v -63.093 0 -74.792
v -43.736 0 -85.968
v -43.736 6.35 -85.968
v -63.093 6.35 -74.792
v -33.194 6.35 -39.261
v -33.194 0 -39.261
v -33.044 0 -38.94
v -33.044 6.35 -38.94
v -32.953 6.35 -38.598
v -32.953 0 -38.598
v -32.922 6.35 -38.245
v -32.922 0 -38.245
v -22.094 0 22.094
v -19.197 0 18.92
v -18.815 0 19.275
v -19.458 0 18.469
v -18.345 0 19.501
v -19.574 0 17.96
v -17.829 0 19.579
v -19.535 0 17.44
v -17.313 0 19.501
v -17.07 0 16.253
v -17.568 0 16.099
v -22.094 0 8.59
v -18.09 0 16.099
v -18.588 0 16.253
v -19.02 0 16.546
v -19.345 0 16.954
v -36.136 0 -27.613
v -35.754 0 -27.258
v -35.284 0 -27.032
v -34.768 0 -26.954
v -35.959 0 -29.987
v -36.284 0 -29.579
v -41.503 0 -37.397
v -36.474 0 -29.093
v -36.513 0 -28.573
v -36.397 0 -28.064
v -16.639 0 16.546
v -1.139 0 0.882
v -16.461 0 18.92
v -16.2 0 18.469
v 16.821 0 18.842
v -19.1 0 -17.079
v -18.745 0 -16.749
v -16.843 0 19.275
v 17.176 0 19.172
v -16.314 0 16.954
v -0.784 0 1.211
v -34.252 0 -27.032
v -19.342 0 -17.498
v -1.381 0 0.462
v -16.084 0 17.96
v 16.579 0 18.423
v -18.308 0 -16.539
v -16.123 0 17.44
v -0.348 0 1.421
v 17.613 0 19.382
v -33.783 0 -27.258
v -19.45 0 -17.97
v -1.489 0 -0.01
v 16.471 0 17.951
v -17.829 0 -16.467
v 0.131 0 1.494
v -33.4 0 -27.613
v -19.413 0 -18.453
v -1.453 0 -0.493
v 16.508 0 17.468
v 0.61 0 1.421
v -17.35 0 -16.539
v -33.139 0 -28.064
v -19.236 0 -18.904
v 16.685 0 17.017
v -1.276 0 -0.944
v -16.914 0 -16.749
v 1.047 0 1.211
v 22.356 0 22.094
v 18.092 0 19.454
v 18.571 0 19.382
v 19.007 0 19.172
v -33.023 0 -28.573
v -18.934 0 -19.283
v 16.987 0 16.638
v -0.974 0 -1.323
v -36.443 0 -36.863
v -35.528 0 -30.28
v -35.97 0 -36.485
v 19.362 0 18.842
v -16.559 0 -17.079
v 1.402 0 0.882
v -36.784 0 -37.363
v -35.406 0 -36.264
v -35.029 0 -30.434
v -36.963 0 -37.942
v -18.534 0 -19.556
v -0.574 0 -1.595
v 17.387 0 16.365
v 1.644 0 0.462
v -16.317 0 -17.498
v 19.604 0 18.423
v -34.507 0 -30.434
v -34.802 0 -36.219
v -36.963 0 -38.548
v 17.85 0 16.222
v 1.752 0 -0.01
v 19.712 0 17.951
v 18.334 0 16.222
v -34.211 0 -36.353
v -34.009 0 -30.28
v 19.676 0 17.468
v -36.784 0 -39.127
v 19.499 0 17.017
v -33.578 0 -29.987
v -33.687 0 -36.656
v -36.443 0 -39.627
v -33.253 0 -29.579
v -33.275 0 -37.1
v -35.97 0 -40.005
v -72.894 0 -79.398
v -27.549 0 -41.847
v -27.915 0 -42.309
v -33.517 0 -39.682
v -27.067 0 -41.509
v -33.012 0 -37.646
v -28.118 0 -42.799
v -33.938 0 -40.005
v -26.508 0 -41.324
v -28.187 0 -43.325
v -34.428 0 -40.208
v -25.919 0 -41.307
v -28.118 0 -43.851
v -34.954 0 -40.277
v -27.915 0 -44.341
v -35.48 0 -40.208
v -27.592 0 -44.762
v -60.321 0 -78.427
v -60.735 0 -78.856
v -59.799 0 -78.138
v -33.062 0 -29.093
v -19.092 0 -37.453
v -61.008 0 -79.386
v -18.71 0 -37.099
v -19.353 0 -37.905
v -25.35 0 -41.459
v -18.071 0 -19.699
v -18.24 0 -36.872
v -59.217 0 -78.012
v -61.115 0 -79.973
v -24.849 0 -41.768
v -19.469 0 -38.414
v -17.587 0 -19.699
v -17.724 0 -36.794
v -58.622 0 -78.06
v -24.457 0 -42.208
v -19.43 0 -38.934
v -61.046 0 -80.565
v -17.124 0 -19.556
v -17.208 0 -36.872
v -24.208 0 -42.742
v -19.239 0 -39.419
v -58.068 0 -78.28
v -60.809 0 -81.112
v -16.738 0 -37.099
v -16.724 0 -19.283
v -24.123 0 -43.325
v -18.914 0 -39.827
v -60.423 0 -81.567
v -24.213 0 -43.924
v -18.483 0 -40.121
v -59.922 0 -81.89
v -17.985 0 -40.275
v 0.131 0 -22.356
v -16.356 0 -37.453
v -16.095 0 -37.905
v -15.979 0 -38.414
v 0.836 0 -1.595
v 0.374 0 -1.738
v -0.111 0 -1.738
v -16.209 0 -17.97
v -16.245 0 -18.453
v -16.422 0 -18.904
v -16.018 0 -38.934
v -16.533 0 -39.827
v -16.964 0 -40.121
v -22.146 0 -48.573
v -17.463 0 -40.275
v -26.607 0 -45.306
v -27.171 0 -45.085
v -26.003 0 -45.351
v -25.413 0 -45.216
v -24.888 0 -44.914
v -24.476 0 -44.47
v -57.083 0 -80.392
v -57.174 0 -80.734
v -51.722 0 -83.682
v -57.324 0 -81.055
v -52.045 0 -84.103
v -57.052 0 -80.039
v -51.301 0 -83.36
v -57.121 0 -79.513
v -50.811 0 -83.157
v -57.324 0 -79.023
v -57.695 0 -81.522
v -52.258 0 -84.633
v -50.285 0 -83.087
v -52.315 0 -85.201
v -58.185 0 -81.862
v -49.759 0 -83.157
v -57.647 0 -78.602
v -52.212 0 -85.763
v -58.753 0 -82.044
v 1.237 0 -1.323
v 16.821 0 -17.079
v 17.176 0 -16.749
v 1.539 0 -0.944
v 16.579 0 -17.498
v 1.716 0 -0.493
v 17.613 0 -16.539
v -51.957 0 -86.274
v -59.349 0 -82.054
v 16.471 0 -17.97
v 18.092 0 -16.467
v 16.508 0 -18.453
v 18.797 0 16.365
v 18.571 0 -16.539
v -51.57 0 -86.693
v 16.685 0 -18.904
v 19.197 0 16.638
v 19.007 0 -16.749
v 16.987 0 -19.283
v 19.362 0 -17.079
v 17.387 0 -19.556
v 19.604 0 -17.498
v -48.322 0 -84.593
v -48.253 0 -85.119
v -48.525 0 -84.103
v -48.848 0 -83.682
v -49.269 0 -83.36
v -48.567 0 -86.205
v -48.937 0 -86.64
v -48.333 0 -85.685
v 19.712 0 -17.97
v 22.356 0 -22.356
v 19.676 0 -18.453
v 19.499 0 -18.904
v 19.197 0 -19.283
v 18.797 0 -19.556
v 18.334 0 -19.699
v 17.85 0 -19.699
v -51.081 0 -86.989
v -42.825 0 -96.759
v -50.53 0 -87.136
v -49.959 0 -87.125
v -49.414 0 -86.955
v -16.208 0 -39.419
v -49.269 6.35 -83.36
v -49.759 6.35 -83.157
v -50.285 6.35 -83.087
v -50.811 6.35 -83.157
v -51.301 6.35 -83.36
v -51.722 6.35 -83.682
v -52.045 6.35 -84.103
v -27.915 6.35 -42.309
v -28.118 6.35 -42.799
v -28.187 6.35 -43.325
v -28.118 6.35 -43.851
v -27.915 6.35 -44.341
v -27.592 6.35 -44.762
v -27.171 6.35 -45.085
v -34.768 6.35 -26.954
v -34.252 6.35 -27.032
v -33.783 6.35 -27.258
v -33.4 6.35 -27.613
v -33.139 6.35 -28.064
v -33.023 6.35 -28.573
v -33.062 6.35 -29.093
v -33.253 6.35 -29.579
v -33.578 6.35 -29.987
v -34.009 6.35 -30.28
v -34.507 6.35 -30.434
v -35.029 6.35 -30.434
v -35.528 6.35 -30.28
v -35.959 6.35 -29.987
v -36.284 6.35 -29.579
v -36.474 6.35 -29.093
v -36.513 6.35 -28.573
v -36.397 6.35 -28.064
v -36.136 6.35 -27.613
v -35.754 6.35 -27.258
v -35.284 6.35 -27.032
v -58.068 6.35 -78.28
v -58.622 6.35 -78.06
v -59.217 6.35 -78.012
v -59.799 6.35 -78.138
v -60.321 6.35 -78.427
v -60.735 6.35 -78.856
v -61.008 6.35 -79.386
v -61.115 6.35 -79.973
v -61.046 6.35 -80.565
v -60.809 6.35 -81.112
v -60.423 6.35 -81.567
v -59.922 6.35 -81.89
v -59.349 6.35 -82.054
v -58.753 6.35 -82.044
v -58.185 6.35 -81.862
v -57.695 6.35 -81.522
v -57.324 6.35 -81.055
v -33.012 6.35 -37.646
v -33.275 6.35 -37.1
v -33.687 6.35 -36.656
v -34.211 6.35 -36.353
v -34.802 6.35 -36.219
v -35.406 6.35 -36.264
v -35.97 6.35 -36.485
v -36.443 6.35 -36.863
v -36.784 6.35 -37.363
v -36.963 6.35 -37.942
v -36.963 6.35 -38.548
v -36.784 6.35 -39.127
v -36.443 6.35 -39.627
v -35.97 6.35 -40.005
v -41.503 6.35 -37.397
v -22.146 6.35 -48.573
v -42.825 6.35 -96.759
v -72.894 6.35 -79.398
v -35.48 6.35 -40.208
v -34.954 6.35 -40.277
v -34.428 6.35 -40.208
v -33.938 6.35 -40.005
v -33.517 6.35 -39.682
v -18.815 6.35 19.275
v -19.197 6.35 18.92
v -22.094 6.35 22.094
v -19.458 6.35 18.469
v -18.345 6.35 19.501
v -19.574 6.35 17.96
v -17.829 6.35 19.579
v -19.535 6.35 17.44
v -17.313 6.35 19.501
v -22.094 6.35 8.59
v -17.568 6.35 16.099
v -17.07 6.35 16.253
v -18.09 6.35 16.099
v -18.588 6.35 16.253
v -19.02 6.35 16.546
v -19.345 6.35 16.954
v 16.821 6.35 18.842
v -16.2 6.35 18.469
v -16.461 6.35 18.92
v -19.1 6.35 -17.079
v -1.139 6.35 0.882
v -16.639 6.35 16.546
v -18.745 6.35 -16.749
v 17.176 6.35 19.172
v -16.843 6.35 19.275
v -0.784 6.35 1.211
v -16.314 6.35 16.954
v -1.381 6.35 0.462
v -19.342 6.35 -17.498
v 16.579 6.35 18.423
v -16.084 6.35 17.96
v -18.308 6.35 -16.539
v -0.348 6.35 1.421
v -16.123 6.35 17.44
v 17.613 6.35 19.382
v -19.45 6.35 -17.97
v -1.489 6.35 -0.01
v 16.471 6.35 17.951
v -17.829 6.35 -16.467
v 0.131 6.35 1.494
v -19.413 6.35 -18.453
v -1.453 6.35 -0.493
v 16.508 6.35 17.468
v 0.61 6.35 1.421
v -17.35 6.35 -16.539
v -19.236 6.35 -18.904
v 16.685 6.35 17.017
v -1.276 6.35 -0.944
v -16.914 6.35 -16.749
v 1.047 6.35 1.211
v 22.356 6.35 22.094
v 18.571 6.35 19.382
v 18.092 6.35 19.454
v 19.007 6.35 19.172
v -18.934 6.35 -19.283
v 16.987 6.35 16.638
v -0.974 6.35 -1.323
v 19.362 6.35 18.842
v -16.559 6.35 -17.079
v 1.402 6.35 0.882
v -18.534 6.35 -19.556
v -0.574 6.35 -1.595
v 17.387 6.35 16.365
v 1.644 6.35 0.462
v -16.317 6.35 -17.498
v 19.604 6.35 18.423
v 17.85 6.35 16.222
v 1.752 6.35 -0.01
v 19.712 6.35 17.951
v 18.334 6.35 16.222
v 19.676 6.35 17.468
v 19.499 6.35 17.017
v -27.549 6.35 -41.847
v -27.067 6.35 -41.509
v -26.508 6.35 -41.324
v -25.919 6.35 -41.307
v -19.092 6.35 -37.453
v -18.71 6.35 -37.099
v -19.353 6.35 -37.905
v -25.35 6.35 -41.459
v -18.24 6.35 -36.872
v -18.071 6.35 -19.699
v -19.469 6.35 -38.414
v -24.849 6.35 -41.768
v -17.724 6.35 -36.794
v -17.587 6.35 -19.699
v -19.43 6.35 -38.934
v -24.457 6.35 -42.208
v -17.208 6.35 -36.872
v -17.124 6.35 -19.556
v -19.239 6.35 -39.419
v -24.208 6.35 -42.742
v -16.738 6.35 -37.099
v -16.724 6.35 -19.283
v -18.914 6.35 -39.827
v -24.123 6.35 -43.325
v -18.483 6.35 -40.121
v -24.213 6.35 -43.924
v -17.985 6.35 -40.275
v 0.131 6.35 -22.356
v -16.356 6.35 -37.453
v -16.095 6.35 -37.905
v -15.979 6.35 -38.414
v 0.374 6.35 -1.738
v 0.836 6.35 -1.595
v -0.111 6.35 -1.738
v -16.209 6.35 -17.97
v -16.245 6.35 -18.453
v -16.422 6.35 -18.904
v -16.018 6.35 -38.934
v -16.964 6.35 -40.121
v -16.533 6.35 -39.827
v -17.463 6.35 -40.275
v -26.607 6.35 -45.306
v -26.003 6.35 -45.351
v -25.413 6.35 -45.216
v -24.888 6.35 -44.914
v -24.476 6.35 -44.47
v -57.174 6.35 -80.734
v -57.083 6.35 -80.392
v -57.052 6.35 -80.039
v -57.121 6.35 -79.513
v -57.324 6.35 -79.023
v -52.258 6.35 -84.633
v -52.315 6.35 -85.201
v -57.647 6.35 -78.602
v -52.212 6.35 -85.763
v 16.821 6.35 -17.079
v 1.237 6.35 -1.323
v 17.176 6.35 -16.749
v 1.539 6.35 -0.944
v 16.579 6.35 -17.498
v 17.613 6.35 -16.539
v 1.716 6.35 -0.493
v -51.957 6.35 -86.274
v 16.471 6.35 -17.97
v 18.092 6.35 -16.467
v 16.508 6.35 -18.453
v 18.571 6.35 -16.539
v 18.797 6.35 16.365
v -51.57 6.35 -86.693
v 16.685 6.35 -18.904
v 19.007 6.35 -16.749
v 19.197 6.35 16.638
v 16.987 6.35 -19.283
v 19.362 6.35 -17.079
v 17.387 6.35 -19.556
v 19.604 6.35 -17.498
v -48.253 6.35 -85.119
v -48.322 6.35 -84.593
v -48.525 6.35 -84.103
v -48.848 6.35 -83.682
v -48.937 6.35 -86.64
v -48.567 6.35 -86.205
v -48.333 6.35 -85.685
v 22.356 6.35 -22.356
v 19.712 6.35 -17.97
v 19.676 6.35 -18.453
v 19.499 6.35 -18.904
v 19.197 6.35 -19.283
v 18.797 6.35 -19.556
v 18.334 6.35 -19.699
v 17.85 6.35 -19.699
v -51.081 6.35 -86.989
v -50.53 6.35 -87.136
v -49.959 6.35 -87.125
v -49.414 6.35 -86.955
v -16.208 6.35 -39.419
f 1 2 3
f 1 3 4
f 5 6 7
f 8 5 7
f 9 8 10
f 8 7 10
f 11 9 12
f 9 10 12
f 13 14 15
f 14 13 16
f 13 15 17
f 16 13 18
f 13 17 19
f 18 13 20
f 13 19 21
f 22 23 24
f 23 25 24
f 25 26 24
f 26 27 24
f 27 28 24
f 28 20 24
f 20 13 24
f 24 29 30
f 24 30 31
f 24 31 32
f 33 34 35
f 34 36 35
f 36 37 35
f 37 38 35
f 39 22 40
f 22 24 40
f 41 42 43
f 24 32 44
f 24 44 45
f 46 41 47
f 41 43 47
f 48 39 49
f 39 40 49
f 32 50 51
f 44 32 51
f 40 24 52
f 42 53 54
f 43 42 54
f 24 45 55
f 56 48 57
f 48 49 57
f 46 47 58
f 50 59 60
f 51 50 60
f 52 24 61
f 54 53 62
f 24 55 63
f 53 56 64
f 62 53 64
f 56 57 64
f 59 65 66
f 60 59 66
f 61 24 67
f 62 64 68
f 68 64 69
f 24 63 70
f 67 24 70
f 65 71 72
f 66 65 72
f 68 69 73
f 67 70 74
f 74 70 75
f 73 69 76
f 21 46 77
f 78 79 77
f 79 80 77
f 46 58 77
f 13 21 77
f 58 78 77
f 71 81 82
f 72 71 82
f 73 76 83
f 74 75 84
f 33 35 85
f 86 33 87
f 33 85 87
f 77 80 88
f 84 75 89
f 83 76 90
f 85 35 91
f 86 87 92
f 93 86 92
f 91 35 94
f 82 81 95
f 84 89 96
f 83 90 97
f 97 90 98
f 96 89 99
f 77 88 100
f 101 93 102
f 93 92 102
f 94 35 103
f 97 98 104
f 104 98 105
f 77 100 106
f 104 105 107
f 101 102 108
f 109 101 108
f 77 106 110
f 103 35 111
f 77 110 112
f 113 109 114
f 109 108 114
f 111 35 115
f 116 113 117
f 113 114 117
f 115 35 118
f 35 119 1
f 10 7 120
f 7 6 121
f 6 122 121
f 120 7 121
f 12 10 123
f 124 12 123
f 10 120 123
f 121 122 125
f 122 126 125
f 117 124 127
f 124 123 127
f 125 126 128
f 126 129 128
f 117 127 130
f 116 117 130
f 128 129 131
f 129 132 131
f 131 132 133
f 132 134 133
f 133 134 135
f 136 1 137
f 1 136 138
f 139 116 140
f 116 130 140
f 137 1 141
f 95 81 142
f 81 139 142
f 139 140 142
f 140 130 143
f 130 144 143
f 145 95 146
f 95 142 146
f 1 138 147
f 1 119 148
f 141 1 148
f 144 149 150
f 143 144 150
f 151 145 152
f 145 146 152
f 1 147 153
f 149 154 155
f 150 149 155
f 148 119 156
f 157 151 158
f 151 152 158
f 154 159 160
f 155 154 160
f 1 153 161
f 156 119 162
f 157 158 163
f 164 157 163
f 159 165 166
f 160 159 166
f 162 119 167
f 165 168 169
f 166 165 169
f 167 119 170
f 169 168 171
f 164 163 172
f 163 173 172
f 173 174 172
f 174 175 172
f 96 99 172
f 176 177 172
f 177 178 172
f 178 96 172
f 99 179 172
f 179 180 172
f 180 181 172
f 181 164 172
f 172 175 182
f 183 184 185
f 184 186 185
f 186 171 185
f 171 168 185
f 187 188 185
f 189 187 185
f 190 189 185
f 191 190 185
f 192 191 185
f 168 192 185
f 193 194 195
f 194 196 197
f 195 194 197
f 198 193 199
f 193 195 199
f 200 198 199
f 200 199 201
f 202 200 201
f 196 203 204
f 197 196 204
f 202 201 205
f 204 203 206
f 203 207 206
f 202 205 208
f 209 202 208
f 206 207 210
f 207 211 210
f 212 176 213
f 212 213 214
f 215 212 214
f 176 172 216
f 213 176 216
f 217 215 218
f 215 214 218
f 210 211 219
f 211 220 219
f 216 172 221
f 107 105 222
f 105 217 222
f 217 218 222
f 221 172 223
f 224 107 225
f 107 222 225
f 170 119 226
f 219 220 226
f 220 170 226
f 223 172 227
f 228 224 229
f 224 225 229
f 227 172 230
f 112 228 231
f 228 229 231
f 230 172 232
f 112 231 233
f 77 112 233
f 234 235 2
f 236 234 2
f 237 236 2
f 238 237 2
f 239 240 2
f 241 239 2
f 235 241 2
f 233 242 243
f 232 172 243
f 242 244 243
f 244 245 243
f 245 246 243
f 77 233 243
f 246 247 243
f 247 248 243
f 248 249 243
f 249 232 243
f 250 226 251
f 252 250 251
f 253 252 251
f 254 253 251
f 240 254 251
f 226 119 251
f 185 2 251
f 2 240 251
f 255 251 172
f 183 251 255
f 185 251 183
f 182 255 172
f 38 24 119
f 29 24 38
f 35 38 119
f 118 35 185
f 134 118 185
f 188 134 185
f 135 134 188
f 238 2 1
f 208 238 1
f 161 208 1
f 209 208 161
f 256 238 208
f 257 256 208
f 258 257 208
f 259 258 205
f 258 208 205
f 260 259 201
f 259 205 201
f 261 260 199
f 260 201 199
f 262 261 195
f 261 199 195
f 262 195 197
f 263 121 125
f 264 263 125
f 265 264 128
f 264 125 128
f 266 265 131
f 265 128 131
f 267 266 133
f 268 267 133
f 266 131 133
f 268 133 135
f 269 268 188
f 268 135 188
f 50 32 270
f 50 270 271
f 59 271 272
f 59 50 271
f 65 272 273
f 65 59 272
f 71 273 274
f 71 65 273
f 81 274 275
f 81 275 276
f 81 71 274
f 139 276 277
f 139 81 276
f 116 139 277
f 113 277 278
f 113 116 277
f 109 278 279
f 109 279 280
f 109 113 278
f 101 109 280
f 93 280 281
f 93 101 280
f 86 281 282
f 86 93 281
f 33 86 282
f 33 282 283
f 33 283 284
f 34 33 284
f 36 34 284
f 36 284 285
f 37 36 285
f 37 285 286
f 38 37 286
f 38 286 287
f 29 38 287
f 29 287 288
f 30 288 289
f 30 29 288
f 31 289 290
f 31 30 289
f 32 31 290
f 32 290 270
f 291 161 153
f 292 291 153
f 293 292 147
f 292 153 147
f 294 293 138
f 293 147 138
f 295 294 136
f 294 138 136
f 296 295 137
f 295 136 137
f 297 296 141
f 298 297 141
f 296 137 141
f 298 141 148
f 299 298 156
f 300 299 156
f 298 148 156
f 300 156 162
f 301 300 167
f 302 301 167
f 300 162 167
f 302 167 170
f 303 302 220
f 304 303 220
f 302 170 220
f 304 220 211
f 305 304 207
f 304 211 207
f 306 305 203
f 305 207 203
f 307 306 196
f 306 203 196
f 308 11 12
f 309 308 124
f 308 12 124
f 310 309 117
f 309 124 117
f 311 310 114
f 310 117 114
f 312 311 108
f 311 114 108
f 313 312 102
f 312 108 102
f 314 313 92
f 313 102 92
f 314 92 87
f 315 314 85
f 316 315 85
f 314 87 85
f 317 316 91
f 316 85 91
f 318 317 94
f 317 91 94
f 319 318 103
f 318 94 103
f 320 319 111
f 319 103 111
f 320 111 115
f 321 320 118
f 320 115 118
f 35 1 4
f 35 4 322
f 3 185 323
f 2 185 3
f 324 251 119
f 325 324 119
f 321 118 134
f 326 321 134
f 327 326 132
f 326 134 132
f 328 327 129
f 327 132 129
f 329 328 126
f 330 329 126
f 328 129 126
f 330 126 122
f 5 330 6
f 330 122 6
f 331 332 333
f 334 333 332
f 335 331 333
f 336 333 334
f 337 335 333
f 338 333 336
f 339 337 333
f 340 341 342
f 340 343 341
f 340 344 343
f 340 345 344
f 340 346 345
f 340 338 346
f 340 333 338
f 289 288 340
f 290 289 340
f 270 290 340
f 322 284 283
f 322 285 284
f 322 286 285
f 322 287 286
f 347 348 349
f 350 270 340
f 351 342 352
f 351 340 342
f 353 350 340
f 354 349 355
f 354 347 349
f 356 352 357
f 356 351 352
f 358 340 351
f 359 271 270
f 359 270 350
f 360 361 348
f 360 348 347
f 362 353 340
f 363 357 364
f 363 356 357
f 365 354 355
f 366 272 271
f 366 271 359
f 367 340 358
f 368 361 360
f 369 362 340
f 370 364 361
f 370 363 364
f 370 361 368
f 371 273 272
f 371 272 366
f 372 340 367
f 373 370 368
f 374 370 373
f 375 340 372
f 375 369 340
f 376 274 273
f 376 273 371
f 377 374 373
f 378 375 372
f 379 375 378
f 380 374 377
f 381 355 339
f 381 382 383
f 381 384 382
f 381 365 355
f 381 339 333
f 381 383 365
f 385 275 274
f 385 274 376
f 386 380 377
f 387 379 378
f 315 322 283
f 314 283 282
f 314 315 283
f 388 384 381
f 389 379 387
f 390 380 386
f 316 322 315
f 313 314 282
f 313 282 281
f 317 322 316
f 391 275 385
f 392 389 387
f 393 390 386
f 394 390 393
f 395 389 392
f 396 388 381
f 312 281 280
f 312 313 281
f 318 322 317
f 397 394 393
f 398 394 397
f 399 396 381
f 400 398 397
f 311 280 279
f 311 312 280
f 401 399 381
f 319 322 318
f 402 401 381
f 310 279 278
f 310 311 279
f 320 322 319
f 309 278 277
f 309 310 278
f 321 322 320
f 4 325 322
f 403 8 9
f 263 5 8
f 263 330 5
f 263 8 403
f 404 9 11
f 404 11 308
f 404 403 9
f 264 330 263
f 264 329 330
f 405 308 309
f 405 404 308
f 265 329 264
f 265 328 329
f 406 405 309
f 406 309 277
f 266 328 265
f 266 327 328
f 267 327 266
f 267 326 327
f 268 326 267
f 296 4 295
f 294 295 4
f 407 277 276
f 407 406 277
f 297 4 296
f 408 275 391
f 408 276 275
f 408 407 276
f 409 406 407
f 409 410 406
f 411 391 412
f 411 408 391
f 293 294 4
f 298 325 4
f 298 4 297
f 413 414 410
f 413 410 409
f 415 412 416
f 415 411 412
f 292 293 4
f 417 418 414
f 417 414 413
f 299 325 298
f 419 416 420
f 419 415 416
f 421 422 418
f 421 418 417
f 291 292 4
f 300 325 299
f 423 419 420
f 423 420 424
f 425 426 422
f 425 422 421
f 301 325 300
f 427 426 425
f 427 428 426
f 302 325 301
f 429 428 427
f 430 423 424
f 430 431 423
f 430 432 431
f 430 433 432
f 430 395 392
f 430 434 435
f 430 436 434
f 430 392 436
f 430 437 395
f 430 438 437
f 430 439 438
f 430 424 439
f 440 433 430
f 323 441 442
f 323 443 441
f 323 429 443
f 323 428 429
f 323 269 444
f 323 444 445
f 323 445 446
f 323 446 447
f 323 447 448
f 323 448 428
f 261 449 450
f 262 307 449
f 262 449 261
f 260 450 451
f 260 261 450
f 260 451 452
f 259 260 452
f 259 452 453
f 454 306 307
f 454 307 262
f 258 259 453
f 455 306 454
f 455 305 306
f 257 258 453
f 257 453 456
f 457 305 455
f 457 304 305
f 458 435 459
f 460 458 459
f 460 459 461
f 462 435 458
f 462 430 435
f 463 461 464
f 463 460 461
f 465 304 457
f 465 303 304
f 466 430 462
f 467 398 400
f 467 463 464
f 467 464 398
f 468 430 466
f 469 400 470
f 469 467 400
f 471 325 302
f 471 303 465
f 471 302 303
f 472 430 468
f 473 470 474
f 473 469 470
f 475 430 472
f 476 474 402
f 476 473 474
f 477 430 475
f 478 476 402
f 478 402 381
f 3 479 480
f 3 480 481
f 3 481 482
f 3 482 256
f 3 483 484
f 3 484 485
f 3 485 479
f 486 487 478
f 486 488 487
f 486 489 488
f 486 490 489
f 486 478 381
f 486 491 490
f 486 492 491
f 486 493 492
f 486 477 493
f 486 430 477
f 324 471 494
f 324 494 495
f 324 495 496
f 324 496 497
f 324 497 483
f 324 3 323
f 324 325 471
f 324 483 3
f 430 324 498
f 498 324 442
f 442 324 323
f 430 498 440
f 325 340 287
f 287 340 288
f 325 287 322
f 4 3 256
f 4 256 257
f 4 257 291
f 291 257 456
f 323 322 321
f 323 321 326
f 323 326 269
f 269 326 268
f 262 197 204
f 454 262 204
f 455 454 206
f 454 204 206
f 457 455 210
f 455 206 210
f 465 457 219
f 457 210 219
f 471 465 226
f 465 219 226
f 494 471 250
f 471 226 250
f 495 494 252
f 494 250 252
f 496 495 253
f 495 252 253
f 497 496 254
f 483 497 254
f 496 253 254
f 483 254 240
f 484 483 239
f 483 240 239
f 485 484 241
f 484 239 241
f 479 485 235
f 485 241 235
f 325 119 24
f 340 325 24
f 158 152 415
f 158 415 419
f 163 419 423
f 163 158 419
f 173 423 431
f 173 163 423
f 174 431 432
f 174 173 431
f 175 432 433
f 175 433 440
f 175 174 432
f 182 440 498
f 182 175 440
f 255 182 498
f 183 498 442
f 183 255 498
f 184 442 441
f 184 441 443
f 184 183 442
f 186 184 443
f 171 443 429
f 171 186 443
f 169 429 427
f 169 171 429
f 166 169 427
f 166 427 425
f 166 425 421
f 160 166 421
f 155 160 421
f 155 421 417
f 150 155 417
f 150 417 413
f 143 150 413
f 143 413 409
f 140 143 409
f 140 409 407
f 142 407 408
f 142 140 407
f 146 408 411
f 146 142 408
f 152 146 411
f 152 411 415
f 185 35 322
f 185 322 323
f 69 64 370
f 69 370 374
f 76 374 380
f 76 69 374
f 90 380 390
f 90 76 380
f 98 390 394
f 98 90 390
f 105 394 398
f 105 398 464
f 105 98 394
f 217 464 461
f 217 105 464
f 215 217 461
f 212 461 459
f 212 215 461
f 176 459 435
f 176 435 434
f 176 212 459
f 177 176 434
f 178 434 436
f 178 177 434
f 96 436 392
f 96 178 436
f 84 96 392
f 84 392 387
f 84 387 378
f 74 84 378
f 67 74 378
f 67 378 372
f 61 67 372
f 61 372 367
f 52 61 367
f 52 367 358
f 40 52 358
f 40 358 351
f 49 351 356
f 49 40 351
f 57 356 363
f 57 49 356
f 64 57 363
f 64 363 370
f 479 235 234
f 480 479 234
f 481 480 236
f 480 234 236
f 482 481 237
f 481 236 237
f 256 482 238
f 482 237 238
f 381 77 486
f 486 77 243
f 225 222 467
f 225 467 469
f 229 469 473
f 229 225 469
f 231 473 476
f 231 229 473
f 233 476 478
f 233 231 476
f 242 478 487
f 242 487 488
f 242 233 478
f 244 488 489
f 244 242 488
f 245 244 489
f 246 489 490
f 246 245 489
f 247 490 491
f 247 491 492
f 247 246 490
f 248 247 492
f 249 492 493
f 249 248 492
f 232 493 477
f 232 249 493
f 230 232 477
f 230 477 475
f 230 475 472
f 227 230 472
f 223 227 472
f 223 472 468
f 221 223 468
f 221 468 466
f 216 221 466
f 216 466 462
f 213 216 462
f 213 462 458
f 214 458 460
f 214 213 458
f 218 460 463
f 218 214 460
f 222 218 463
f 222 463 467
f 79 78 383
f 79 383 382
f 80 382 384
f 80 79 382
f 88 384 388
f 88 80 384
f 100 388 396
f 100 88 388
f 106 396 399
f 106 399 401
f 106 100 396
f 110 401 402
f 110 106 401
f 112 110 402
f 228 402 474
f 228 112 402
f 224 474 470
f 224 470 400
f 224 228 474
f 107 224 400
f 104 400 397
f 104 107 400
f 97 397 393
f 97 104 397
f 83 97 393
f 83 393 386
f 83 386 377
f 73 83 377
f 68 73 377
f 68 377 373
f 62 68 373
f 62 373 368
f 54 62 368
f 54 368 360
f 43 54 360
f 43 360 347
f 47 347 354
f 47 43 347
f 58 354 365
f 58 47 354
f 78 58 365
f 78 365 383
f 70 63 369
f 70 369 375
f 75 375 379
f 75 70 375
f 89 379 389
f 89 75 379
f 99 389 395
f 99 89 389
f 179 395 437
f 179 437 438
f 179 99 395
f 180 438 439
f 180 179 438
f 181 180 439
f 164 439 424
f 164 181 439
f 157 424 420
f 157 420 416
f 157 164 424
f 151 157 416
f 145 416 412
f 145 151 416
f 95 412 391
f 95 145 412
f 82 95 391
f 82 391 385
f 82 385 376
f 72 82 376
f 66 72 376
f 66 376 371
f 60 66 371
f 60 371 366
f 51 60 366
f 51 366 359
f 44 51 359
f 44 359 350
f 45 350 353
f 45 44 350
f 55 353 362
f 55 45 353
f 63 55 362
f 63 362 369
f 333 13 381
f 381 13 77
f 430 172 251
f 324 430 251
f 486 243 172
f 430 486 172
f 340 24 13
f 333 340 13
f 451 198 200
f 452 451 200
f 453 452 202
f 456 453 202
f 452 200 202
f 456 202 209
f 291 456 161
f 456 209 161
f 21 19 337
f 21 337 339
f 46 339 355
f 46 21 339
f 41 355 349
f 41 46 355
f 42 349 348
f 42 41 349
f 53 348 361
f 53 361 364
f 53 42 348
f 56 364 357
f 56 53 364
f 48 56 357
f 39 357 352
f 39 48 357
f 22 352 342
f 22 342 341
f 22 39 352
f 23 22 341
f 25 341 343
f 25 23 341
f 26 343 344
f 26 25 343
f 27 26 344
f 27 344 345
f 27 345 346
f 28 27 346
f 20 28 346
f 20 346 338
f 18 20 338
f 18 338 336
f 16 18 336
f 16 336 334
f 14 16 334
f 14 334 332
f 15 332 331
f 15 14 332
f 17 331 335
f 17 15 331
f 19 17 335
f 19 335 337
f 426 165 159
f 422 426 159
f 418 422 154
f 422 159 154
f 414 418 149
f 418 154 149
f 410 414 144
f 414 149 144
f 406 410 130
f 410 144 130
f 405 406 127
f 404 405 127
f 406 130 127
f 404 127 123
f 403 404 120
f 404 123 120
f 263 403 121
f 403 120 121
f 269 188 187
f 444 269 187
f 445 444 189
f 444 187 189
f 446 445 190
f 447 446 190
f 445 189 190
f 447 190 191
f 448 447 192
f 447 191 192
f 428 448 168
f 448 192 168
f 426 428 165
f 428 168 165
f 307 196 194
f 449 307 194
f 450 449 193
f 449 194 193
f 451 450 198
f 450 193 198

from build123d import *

# Parameters (mm, degrees)
SKETCH1_R           = 1.75
SKETCH1_R_2         = 1.625
SKETCH1_R_3         = 1.74995
BOSS_EXTRUDE1_DEPTH = 6.35
SKETCH2_R           = 1.74995
CUT_EXTRUDE1_DEPTH  = 122.309718695


with BuildPart() as part:
    # Sketch1 → Boss-Extrude1 (new body)
    with BuildSketch(Plane(origin=(0, 0, 0), x_dir=(1, 0, 0), z_dir=(0, 1, 0))):
        Polygon((22.35631132, -22.09368868), (22.35631132, 22.35631132), (0.13131132, 22.35631132), (-42.824896411, 96.75864561), (-72.89368868, 79.3984203), (-22.09368868, -8.589760725), (-22.09368868, -22.09368868), align=None)
        with Locations(Location((-17.829200922, -17.829200922, 0), (0, 0, 270))):
            Circle(SKETCH1_R, mode=Mode.SUBTRACT)
        with Locations(Location((0.13131132, 0.13131132, 0), (0, 0, 270))):
            Circle(SKETCH1_R_2, mode=Mode.SUBTRACT)
        with Locations(Location((18.091823562, 18.091823562, 0), (0, 0, 270))):
            Circle(SKETCH1_R_2, mode=Mode.SUBTRACT)
        with Locations(Location((18.091823562, -17.829200922, 0), (0, 0, 270))):
            Circle(SKETCH1_R_2, mode=Mode.SUBTRACT)
        with Locations(Location((-17.829200922, 18.091823562, 0), (0, 0, 270))):
            Circle(SKETCH1_R_2, mode=Mode.SUBTRACT)
        with Locations(Location((-17.723762663, 38.544433004, 0), (0, 0, 270))):
            Circle(SKETCH1_R_3, mode=Mode.SUBTRACT)
        with Locations(Location((-34.76828868, 28.70377132, 0), (0, 0, 270))):
            Circle(SKETCH1_R_3, mode=Mode.SUBTRACT)
    extrude(amount=BOSS_EXTRUDE1_DEPTH)

    # Sketch2 → Cut-Extrude1 (cut, through all)
    with BuildSketch(Plane.XZ):
        with BuildLine():
            ThreePointArc((-49.268883494, -83.359508021), (-50.810803794, -83.156510362), (-52.044647115, -84.103271641))
            Line((-52.044647115, -84.103271641), (-50.284883494, -85.119271641))
            Line((-50.284883494, -85.119271641), (-49.268883494, -83.359508021))
        make_face()
        with BuildLine():
            Line((-50.284883494, -85.119271641), (-52.044647115, -84.103271641))
            ThreePointArc((-52.044647115, -84.103271641), (-50.810803794, -87.08203292), (-48.252883494, -85.119271641))
            ThreePointArc((-48.252883494, -85.119271641), (-48.525119874, -84.103271641), (-49.268883494, -83.359508021))
            Line((-49.268883494, -83.359508021), (-50.284883494, -85.119271641))
        make_face()
        with BuildLine():
            Line((-57.323937976, -81.055271641), (-59.083701597, -80.039271641))
            Line((-59.083701597, -80.039271641), (-58.067701597, -78.279508021))
            ThreePointArc((-58.067701597, -78.279508021), (-61.046462876, -80.565191941), (-57.323937976, -81.055271641))
        make_face()
        with BuildLine():
            Line((-58.067701597, -78.279508021), (-59.083701597, -80.039271641))
            Line((-59.083701597, -80.039271641), (-57.323937976, -81.055271641))
            ThreePointArc((-57.323937976, -81.055271641), (-57.120940318, -80.565191941), (-57.051701597, -80.039271641))
            ThreePointArc((-57.051701597, -80.039271641), (-57.323937976, -79.023271641), (-58.067701597, -78.279508021))
        make_face()
        with BuildLine():
            ThreePointArc((-27.914647115, -42.308885654), (-28.117644773, -43.850805954), (-27.170883494, -45.084649275))
            Line((-27.170883494, -45.084649275), (-26.154883494, -43.324885654))
            Line((-26.154883494, -43.324885654), (-27.914647115, -42.308885654))
        make_face()
        with BuildLine():
            Line((-26.154883494, -43.324885654), (-27.170883494, -45.084649275))
            ThreePointArc((-27.170883494, -45.084649275), (-25.138883494, -45.084649275), (-24.122883494, -43.324885654))
            ThreePointArc((-24.122883494, -43.324885654), (-25.628963195, -41.362124375), (-27.914647115, -42.308885654))
            Line((-27.914647115, -42.308885654), (-26.154883494, -43.324885654))
        make_face()
        with BuildLine():
            ThreePointArc((-32.921701597, -38.244885654), (-35.969701597, -36.485122034), (-35.969701597, -40.004649275))
            Line((-35.969701597, -40.004649275), (-34.953701597, -38.244885654))
            Line((-34.953701597, -38.244885654), (-33.193937976, -39.260885654))
            ThreePointArc((-33.193937976, -39.260885654), (-32.990940318, -38.770805954), (-32.921701597, -38.244885654))
        make_face()
        with BuildLine():
            Line((-34.953701597, -38.244885654), (-35.969701597, -40.004649275))
            ThreePointArc((-35.969701597, -40.004649275), (-34.427781297, -40.207646933), (-33.193937976, -39.260885654))
            Line((-33.193937976, -39.260885654), (-34.953701597, -38.244885654))
        make_face()
        with Locations(Location((-17.723762663, -38.544433004, 0), (0, 0, 90))):
            Circle(SKETCH2_R)
        Polygon((-22.145592633, -48.57259018), (-43.735592633, -85.967567115), (-63.092992458, -74.791567115), (-41.502992458, -37.39659018), align=None)
    extrude(amount=-CUT_EXTRUDE1_DEPTH, mode=Mode.SUBTRACT)


solid = part.part
